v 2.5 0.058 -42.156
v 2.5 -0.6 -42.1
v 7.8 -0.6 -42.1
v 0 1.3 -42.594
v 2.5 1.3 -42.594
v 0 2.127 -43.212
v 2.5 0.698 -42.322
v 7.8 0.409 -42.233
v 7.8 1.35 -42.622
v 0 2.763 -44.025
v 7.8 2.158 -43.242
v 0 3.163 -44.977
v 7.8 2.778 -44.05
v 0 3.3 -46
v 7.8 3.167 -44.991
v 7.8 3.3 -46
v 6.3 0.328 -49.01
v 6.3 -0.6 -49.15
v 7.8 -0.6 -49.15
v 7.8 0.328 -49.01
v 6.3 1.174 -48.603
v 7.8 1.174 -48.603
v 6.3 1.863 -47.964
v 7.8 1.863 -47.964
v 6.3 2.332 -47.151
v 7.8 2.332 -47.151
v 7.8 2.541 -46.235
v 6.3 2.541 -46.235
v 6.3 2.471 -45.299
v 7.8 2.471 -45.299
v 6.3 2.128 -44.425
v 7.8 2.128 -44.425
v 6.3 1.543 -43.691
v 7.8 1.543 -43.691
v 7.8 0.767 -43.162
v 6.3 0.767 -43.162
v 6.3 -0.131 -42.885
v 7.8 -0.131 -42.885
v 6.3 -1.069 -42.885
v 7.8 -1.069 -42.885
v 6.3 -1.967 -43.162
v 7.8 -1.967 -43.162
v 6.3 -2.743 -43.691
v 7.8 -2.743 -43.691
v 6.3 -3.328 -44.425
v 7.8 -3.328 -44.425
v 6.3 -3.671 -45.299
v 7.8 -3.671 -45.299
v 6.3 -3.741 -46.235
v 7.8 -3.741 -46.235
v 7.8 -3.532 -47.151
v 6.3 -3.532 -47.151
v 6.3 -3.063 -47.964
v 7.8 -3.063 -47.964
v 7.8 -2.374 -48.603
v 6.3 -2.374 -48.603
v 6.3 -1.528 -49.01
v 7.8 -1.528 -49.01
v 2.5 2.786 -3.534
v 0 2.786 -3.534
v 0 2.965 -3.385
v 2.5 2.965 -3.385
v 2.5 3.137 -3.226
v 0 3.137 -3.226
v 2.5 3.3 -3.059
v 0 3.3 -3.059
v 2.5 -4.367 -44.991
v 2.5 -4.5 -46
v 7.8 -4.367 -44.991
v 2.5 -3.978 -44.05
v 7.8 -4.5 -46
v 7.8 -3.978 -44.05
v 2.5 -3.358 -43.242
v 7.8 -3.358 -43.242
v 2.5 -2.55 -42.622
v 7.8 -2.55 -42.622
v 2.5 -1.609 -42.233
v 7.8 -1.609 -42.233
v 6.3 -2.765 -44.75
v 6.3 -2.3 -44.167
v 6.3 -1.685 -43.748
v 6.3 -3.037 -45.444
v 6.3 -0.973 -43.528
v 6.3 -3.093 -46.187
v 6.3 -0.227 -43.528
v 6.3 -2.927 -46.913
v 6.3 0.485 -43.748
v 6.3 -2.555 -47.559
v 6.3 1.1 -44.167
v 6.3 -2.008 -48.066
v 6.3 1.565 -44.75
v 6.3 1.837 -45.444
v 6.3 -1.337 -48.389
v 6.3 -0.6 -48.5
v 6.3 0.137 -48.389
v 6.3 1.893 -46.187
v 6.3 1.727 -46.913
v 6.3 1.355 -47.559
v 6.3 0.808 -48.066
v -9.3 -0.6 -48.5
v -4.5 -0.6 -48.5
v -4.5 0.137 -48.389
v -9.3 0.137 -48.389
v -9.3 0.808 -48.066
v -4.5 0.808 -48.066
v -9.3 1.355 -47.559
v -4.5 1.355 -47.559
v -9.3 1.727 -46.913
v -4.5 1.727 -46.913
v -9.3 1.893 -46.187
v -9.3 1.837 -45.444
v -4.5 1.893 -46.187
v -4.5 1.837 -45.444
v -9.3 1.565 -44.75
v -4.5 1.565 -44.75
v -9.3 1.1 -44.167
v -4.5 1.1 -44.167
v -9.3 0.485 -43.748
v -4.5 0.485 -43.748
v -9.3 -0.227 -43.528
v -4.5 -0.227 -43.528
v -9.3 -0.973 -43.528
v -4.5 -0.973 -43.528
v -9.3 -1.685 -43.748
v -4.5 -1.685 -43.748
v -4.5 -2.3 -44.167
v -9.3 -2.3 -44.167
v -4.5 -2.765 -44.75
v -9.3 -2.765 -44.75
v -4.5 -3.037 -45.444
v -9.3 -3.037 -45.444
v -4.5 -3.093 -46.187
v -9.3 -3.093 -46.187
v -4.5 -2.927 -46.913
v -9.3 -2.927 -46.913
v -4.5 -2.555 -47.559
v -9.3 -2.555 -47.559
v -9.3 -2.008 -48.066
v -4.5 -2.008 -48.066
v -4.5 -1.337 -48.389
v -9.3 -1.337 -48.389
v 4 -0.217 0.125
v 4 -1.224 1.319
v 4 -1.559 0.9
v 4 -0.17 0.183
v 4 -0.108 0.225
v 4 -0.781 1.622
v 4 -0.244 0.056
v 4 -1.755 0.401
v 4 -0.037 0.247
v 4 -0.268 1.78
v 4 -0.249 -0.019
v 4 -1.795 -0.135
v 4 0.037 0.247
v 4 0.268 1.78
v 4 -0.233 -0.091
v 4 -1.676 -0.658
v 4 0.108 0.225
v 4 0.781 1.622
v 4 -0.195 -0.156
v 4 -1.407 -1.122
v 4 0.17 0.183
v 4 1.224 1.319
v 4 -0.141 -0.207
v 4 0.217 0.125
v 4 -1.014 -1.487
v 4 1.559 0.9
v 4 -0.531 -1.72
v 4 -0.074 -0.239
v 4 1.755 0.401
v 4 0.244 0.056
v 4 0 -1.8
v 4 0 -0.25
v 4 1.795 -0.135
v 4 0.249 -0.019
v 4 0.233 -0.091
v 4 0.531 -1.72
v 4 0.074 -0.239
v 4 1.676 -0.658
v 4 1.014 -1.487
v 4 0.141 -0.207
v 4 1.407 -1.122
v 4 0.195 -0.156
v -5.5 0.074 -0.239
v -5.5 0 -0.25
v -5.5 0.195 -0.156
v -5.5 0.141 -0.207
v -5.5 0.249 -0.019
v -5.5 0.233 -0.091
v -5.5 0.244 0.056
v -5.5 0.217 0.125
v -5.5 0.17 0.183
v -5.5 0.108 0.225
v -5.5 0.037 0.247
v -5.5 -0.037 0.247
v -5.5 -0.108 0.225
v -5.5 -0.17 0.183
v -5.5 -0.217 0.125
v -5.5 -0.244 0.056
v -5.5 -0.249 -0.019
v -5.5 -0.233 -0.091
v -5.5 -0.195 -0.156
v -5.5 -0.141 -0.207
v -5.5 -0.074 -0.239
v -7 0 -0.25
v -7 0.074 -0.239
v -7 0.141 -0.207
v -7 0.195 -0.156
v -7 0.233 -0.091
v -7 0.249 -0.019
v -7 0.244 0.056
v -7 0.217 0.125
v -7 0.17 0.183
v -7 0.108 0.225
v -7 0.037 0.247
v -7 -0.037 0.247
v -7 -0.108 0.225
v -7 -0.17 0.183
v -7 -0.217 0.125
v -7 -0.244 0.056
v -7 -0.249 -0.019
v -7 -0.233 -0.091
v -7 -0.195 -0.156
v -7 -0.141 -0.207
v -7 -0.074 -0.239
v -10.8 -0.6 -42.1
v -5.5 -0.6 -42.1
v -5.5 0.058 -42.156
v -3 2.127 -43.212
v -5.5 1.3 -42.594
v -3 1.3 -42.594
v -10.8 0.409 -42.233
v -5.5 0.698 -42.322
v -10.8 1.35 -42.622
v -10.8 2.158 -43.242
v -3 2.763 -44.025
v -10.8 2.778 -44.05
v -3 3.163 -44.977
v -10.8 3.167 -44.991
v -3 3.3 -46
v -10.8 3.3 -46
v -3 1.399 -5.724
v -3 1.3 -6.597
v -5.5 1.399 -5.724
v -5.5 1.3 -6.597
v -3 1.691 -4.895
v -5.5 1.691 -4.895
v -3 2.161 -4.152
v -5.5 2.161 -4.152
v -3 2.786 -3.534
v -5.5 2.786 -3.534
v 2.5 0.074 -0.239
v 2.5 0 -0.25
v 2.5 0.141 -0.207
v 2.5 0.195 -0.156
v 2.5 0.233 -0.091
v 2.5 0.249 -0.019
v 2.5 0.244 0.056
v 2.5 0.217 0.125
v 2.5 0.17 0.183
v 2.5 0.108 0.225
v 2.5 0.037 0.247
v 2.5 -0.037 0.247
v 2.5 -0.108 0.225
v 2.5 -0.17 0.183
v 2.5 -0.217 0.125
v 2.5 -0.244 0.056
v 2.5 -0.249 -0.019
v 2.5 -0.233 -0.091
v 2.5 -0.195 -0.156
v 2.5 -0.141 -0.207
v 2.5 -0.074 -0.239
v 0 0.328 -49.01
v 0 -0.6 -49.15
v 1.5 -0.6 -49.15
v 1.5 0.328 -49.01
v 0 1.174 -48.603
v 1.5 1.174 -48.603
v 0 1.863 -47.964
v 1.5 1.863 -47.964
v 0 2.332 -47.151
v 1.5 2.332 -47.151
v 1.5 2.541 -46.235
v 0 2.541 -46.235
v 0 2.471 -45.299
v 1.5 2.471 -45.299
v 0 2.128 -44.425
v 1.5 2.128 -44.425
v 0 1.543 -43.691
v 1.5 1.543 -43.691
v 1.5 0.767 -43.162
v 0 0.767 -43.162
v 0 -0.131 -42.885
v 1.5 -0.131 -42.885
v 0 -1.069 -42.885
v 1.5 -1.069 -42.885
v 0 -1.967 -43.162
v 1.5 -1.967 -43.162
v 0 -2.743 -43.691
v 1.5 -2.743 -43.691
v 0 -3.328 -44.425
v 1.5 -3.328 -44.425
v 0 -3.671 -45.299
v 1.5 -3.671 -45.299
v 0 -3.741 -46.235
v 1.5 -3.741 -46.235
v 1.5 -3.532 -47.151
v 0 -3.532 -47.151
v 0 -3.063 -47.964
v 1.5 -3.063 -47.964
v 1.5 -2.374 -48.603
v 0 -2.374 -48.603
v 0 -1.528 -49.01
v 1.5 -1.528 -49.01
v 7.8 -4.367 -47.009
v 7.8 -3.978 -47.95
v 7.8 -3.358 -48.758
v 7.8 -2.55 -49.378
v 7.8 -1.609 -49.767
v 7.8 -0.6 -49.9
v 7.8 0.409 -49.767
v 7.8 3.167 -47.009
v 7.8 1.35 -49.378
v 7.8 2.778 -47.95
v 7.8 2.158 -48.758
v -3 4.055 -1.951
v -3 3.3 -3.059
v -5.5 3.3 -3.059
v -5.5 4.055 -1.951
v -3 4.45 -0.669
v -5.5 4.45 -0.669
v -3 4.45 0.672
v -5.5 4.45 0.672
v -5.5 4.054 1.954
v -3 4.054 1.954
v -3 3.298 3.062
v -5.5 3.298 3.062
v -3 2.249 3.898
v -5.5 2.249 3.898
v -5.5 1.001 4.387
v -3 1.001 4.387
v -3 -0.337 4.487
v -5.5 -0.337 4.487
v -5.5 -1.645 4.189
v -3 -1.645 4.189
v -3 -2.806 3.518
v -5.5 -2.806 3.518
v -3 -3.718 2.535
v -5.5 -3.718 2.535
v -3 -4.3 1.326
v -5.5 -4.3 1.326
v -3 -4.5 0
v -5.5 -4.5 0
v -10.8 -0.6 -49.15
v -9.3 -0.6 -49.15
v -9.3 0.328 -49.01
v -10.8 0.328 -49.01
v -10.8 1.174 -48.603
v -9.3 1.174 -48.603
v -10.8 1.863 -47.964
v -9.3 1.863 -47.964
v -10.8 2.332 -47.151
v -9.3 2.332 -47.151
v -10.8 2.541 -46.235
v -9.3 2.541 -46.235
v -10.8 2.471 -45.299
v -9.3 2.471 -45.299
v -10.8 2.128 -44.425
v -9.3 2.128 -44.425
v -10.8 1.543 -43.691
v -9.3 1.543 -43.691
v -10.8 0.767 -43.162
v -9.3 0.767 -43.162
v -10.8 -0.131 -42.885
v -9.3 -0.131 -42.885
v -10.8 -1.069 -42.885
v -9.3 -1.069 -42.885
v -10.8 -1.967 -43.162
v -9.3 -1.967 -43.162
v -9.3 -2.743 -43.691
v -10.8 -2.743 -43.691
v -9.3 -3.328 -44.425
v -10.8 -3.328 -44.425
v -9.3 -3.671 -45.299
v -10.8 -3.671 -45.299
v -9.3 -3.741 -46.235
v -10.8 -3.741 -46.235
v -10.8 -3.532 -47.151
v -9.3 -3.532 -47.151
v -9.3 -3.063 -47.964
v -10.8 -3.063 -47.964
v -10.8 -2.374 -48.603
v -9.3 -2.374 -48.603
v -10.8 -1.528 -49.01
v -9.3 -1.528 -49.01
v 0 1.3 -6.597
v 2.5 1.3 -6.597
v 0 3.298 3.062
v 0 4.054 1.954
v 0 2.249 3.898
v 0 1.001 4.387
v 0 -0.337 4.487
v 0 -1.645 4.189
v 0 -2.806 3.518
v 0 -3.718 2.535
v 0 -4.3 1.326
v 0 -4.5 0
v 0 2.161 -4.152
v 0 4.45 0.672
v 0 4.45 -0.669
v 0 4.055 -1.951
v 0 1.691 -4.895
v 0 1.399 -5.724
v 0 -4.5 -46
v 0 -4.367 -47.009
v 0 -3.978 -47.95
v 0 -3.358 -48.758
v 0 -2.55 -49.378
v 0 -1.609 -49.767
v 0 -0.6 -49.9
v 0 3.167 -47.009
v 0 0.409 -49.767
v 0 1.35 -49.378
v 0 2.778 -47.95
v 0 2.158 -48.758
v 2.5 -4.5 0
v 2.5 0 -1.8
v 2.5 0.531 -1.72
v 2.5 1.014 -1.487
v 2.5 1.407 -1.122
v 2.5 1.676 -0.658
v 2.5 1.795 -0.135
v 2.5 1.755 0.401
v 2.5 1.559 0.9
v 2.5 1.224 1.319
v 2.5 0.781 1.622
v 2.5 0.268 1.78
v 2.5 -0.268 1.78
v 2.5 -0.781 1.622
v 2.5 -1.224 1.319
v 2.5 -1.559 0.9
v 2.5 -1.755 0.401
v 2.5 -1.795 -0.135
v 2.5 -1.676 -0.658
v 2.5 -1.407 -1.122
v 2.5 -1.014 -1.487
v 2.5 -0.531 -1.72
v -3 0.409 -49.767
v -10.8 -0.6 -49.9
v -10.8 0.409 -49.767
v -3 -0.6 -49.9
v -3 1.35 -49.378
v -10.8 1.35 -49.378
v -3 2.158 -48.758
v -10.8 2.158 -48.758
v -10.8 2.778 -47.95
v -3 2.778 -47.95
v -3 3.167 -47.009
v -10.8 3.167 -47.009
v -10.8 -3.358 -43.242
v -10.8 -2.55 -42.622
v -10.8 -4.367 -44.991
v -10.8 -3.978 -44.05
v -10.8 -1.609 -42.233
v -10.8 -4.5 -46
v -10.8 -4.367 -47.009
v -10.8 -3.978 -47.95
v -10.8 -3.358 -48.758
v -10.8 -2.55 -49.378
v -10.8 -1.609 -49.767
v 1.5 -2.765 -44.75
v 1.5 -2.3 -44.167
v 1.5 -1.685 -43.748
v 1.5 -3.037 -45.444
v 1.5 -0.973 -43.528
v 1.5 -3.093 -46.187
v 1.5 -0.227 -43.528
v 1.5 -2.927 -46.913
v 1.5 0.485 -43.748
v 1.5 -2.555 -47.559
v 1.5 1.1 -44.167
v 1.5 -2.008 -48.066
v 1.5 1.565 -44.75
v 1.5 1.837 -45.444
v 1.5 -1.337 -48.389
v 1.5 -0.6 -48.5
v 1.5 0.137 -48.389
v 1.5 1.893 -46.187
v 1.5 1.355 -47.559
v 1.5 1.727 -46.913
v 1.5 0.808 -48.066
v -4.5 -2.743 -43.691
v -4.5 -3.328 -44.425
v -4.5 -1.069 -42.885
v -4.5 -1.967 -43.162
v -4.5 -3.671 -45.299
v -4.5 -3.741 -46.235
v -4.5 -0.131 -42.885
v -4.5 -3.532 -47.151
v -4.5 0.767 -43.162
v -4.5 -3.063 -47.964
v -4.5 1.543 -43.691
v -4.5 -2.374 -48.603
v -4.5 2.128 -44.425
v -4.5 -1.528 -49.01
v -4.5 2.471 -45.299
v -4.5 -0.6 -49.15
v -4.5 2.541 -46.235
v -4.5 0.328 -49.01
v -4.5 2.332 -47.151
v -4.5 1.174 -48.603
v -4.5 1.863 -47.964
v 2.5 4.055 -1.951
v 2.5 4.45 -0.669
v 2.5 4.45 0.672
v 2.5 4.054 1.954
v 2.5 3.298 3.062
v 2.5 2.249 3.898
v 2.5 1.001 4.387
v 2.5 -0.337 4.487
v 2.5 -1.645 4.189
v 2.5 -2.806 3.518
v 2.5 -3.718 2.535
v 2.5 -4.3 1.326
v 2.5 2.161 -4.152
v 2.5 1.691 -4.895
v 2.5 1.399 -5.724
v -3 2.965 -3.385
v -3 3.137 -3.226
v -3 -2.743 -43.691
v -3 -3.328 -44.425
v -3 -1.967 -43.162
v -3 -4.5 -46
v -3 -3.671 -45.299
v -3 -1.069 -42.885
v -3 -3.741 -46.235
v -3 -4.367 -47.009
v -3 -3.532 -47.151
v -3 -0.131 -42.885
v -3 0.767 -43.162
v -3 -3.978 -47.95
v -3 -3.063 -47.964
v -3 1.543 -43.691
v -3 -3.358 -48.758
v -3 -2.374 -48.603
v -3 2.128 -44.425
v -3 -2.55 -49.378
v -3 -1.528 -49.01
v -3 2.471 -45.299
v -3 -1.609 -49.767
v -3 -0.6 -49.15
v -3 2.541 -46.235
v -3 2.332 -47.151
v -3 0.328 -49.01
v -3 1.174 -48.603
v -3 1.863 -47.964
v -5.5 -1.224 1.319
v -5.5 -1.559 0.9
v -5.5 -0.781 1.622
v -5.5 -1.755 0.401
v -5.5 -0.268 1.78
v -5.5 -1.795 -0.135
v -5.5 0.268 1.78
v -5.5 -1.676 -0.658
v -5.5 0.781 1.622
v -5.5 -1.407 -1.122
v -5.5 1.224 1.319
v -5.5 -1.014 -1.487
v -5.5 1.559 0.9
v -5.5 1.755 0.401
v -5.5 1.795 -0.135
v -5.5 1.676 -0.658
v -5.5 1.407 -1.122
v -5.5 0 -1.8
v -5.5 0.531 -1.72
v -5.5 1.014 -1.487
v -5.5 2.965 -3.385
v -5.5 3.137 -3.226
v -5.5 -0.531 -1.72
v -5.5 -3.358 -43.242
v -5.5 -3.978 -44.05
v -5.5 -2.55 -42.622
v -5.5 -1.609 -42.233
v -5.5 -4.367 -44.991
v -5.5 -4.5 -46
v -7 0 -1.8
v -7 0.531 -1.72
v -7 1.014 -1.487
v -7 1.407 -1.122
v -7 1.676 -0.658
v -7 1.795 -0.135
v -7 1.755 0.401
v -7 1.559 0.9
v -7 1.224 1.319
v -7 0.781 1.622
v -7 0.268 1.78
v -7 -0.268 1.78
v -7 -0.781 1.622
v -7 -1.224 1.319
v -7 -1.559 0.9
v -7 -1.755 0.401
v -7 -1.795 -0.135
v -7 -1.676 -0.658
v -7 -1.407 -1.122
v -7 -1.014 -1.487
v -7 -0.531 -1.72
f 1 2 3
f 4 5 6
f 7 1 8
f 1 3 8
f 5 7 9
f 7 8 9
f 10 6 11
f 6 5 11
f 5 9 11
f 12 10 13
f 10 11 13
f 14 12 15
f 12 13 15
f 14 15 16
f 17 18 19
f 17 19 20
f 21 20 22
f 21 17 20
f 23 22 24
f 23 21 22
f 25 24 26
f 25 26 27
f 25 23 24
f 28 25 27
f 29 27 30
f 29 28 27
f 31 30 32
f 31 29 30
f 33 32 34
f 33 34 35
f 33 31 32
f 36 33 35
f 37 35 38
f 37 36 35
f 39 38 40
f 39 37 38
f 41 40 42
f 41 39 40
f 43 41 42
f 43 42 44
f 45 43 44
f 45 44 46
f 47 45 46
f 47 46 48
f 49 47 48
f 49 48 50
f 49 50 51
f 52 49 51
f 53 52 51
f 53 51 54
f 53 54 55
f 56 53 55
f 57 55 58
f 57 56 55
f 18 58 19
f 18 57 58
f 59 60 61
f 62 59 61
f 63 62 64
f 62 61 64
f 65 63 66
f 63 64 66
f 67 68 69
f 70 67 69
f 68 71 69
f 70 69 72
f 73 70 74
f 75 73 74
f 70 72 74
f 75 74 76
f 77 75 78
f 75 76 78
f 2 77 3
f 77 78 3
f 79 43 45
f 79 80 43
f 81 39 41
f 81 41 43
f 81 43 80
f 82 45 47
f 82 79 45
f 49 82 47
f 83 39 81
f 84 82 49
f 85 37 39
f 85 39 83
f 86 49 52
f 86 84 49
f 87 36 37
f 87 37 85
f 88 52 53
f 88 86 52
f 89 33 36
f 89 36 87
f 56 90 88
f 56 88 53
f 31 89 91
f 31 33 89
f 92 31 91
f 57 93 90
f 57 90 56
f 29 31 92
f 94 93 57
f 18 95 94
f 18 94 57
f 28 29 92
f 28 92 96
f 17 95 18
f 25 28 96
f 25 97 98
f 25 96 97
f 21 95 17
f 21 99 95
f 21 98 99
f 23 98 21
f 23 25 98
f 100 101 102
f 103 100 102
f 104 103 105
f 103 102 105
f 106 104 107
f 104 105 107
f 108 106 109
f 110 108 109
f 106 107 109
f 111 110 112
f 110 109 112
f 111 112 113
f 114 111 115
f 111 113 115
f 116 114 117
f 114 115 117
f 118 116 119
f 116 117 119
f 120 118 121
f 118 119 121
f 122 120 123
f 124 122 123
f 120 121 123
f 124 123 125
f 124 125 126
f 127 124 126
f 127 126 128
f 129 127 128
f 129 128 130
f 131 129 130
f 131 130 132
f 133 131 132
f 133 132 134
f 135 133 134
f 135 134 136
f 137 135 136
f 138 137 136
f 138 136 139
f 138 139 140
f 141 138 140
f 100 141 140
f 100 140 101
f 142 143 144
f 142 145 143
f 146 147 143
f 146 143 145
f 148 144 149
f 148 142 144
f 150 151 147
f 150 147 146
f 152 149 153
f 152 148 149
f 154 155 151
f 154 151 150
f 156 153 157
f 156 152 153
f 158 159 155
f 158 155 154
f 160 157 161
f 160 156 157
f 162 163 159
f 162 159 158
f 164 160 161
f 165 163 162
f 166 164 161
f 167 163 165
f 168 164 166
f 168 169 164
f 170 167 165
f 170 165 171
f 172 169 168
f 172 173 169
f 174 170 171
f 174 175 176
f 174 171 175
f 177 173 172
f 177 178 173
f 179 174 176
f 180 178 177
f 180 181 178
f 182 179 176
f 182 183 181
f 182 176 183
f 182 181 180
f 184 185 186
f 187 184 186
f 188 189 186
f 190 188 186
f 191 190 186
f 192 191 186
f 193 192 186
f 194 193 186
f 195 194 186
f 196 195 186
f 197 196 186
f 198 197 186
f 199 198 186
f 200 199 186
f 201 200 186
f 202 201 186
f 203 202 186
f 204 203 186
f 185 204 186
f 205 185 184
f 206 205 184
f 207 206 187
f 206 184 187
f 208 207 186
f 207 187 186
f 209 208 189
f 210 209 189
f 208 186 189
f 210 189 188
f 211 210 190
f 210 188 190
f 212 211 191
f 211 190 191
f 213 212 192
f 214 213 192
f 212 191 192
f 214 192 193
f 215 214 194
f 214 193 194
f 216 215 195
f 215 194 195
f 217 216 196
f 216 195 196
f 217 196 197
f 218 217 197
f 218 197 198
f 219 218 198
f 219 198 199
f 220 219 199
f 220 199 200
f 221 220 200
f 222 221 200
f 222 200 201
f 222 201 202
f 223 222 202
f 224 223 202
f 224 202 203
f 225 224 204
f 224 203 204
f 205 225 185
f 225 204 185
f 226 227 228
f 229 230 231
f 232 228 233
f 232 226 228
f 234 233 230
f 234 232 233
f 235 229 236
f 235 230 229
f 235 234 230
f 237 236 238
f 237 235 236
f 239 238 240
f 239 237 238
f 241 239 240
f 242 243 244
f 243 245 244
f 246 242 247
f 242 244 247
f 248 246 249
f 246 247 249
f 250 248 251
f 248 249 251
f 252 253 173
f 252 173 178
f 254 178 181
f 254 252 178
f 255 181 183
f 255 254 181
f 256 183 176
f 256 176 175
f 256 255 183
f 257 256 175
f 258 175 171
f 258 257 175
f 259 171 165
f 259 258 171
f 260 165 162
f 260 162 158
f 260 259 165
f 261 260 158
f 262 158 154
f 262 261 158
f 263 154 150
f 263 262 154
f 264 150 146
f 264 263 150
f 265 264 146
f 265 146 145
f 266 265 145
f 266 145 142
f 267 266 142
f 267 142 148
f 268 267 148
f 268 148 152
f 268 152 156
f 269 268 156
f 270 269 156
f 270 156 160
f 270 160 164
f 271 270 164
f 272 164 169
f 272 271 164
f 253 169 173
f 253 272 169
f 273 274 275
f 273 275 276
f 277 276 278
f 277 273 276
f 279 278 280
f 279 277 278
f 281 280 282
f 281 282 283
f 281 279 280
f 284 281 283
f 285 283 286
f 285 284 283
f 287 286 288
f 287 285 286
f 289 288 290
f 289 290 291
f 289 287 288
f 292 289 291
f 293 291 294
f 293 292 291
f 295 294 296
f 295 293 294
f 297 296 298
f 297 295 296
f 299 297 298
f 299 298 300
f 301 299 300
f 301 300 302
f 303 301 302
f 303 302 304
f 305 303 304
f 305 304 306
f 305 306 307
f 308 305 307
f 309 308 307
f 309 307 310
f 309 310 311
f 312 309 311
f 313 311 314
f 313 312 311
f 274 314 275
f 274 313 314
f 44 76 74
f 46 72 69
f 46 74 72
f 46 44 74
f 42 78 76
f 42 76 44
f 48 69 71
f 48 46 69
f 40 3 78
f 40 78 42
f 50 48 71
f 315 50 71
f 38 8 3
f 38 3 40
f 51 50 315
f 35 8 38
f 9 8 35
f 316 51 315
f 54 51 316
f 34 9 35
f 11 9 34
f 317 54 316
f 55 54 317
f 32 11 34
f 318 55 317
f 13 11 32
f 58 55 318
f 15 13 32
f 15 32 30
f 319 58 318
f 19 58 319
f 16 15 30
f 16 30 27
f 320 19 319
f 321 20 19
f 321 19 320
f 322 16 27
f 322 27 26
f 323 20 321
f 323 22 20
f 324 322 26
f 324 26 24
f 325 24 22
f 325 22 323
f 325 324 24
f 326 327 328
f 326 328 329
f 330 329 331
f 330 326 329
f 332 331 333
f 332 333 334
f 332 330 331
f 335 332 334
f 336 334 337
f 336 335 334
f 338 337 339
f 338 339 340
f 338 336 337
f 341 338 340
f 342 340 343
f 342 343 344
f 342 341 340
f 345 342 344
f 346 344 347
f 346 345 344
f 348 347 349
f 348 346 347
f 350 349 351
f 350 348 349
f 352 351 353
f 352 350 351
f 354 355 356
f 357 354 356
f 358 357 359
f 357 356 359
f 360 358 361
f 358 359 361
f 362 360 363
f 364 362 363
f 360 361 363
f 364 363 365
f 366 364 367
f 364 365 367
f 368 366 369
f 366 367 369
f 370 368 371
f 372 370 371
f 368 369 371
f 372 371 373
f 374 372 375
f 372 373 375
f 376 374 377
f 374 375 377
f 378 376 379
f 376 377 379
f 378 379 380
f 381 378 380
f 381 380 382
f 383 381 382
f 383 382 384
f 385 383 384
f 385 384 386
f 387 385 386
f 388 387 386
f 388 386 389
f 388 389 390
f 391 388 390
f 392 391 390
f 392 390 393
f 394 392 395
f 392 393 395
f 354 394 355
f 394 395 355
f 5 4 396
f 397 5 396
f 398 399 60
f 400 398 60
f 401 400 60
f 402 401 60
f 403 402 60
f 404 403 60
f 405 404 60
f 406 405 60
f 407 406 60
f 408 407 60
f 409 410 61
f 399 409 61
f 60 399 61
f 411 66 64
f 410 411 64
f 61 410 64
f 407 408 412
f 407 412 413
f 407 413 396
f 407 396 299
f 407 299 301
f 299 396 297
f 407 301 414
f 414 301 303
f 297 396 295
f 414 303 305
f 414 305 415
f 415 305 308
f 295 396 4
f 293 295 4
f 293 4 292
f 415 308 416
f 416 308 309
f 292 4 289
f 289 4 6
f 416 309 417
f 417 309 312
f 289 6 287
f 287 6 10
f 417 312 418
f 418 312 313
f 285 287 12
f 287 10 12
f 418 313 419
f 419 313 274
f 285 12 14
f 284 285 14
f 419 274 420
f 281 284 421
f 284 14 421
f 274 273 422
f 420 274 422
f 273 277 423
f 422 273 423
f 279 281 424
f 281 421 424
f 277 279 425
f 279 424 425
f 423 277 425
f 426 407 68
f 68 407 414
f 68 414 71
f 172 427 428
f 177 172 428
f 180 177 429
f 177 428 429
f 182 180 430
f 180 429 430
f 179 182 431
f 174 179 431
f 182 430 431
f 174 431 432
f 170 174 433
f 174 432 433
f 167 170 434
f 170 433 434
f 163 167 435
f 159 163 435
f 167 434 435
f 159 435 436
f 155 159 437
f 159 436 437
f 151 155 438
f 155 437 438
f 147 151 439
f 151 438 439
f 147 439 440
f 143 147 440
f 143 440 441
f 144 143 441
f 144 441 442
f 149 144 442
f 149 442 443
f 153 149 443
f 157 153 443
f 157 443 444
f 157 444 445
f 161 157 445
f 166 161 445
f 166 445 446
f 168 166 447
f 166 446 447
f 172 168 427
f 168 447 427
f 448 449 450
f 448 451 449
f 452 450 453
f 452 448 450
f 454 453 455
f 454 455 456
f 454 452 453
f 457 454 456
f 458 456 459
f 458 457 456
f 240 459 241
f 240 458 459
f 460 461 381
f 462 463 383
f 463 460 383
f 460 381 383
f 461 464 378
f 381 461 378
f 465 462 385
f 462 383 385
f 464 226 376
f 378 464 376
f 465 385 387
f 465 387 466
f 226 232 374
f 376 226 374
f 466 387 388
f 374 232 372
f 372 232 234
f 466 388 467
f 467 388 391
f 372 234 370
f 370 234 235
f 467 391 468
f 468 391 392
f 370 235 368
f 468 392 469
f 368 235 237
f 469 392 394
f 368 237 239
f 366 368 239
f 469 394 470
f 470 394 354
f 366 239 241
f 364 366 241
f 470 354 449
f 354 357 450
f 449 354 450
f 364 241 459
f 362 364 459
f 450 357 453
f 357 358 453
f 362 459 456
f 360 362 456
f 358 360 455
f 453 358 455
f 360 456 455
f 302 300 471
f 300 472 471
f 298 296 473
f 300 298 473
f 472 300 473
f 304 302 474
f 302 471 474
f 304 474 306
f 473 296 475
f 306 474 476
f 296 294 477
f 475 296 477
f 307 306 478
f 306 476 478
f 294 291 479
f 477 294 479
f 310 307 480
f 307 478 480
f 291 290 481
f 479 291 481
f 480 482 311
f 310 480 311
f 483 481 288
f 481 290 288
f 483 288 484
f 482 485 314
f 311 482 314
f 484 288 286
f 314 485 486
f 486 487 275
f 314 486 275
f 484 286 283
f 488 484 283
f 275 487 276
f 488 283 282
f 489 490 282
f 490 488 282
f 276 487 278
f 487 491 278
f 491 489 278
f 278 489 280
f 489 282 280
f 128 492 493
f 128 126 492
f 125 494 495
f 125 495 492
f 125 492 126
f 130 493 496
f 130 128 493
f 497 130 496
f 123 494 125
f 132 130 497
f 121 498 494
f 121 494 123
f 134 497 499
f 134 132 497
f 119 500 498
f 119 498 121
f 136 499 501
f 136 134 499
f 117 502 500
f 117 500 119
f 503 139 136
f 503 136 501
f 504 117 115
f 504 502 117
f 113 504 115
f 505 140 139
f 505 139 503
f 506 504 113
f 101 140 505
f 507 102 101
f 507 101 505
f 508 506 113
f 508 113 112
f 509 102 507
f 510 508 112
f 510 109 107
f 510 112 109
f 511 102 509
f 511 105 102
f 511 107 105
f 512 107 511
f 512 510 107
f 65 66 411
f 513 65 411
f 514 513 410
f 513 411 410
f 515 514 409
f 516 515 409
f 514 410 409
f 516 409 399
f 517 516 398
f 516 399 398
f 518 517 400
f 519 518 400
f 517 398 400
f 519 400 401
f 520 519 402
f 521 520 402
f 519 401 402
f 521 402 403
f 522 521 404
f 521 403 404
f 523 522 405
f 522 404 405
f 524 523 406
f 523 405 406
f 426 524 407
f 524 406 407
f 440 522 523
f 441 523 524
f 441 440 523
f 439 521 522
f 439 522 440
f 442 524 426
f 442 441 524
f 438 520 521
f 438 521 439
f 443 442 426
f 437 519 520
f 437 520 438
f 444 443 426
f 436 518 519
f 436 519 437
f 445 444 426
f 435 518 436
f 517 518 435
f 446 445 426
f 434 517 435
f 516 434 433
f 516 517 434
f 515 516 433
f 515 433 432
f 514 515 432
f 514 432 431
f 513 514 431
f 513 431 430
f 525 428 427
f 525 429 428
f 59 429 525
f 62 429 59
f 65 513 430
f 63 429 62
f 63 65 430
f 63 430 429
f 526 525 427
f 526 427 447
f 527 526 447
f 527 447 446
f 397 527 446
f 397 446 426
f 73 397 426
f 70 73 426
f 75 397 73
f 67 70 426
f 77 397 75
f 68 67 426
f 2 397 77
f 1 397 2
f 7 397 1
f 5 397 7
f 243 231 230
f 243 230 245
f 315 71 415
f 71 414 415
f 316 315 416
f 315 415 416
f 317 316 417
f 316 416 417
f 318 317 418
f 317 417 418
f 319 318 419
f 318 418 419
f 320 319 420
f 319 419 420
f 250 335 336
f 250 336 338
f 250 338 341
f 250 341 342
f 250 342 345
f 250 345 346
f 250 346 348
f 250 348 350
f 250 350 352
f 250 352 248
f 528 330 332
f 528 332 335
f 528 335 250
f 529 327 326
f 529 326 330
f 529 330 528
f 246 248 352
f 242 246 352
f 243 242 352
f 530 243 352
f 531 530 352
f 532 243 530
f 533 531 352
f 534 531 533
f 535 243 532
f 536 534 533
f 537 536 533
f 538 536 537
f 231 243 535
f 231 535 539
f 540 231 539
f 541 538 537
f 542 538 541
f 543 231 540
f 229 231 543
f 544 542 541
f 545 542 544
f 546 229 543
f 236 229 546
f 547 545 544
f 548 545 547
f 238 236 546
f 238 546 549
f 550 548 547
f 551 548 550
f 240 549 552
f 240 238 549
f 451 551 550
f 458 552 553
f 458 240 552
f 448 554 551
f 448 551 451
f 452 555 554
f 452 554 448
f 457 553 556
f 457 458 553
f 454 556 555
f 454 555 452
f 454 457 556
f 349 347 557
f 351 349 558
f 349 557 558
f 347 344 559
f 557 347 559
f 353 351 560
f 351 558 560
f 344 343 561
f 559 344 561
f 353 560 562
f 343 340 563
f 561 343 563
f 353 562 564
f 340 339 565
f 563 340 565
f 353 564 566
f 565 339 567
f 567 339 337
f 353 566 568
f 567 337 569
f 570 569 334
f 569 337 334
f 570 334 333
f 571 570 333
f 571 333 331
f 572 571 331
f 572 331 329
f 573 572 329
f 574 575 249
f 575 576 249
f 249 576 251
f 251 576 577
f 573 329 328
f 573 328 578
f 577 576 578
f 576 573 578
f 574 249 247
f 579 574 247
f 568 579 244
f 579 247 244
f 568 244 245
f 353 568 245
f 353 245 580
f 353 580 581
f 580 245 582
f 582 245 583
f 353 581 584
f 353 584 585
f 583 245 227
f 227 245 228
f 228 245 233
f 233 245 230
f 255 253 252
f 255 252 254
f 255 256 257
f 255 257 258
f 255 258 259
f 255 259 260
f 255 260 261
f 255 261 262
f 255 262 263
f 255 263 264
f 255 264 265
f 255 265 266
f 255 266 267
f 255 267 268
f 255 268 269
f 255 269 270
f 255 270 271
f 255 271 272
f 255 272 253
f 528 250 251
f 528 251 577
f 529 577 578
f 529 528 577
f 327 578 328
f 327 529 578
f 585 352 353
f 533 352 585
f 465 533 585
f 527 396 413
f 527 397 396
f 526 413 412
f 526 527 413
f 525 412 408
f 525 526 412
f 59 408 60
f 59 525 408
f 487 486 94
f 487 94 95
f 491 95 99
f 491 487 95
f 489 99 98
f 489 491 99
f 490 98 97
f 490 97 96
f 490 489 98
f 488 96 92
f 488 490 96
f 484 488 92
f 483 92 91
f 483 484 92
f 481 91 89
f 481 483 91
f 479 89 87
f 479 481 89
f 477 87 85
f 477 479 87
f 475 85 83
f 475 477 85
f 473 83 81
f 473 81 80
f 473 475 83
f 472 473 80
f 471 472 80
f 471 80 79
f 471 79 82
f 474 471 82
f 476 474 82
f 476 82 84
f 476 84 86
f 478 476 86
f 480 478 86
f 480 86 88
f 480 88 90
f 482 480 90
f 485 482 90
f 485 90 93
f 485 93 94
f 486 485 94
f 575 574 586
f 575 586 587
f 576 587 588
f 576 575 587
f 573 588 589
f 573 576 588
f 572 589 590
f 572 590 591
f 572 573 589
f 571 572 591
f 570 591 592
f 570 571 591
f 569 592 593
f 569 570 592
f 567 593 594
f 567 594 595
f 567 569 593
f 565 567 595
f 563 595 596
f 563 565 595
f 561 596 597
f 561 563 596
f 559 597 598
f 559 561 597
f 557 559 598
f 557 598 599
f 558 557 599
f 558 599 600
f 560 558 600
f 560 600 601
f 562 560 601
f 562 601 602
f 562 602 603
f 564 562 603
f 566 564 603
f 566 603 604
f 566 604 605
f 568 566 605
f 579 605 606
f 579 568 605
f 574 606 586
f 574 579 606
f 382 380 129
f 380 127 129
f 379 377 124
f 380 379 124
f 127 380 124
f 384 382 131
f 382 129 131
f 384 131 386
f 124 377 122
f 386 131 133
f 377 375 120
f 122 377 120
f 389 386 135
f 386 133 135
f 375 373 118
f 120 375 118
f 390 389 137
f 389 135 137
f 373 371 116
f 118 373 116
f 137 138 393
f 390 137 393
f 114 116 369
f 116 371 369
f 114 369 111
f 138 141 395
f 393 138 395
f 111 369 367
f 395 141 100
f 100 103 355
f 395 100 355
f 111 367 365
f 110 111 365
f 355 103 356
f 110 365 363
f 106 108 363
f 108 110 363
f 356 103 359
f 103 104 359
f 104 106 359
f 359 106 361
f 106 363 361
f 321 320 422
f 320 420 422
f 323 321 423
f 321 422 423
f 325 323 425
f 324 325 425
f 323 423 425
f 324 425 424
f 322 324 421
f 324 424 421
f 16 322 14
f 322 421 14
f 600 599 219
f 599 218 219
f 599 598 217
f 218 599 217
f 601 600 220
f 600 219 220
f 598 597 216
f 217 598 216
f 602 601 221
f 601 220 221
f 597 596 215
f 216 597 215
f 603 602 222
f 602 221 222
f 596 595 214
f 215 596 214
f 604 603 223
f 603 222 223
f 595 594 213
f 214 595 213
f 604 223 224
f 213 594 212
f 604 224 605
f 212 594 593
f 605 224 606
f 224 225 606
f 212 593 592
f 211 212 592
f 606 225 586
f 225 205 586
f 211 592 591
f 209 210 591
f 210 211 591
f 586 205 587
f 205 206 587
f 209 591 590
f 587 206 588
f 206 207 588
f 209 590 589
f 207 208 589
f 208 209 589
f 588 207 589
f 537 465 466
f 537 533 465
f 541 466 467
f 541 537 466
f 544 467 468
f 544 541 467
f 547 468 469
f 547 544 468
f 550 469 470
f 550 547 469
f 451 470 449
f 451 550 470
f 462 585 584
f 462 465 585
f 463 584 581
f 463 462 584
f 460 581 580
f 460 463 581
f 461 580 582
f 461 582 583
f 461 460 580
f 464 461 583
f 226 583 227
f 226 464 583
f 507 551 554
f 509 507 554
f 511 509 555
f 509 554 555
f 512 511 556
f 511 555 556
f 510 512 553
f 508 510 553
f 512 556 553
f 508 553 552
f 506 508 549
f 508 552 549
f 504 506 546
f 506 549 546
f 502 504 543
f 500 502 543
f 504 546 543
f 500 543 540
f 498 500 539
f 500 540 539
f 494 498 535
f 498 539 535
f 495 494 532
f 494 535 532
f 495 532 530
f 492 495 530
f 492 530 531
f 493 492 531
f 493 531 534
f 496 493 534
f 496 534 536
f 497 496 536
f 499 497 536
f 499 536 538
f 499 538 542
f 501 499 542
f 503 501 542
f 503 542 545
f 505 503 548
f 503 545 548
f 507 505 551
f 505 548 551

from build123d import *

# Parameters (mm, degrees)
SKETCH_1_R          = 4.5
SKETCH_1_W          = 49.9
SKETCH_1_H          = 7.8
EXTRUDE_1_DEPTH     = 2.5
EXTRUDE_START       = 2.5
SKETCH_1_6_R        = 1.8
SKETCH_1_6_R_2      = 0.25
EXTRUDE_3_DEPTH     = 1.5
SKETCH_1_5_W        = 7.8
SKETCH_1_5_H        = 7.8
EXTRUDE_2_DEPTH     = 7.8
SKETCH_1_7_R        = 2.5
CUT_EXTRUDE_1_DEPTH = 51.706015422
SKETCH_1_8_R        = 3.15
SKETCH_1_8_R_2      = 2.5
CUT_EXTRUDE_2_DEPTH = 1.5
CUT_EXTRUDE_START   = 6.3
SKETCH_1_9_R        = 3.15
SKETCH_1_9_R_2      = 2.5
CUT_EXTRUDE_3_DEPTH = 1.5
SKETCH_2_W          = 0.191868154
SKETCH_2_H          = 2
SKETCH_2_W_2        = 37.6
CUT_EXTRUDE_4_DEPTH = 51.706015422
FILLET_1_R          = 3.9


with BuildPart() as part:
    # 草图1 → 凸台-拉伸1 (new body)
    with BuildSketch(Plane(origin=(0, 0, 0), x_dir=(0, 0, -1), z_dir=(1, 0, 0))):
        Circle(SKETCH_1_R)
        with Locations((24.95, -0.6)):
            Rectangle(SKETCH_1_W, SKETCH_1_H)
    extrude(amount=EXTRUDE_1_DEPTH)

    # 草图1<6> → 凸台-拉伸3 (add)
    with BuildSketch(Plane(origin=(0, 0, 0), x_dir=(0, 0, -1), z_dir=(1, 0, 0)).offset(EXTRUDE_START)):
        Circle(SKETCH_1_6_R)
        Circle(SKETCH_1_6_R_2, mode=Mode.SUBTRACT)
    extrude(amount=EXTRUDE_3_DEPTH)

    # 草图1<5> → 凸台-拉伸2 (add)
    with BuildSketch(Plane(origin=(0, 0, 0), x_dir=(0, 0, -1), z_dir=(1, 0, 0))):
        with Locations((46, -0.6)):
            Rectangle(SKETCH_1_5_W, SKETCH_1_5_H)
    extrude(amount=EXTRUDE_2_DEPTH)

    # 草图1<7> → 切除-拉伸1 (cut, through all)
    with BuildSketch(Plane(origin=(0, 0, 0), x_dir=(0, 0, -1), z_dir=(1, 0, 0))):
        with Locations((46, -0.6)):
            Circle(SKETCH_1_7_R)
    extrude(amount=CUT_EXTRUDE_1_DEPTH, mode=Mode.SUBTRACT)

    # 草图1<8> → 切除-拉伸2 (cut)
    with BuildSketch(Plane(origin=(0, 0, 0), x_dir=(0, 0, -1), z_dir=(1, 0, 0))):
        with Locations((46, -0.6)):
            Circle(SKETCH_1_8_R)
        with Locations((46, -0.6)):
            Circle(SKETCH_1_8_R_2, mode=Mode.SUBTRACT)
    extrude(amount=CUT_EXTRUDE_2_DEPTH, mode=Mode.SUBTRACT)

    # 草图1<9> → 切除-拉伸3 (cut)
    with BuildSketch(Plane(origin=(0, 0, 0), x_dir=(0, 0, -1), z_dir=(1, 0, 0)).offset(CUT_EXTRUDE_START)):
        with Locations((46, -0.6)):
            Circle(SKETCH_1_9_R)
        with Locations((46, -0.6)):
            Circle(SKETCH_1_9_R_2, mode=Mode.SUBTRACT)
    extrude(amount=CUT_EXTRUDE_3_DEPTH, mode=Mode.SUBTRACT)

    # 草图2 → 切除-拉伸4 (cut, through all)
    with BuildSketch(Plane.ZY):
        with BuildLine():
            Line((-3.059411708, 3.3), (-4.308131846, 3.3))
            Line((-4.308131846, 3.3), (-4.308131846, 1.3))
            ThreePointArc((-4.308131846, 1.3), (-3.817089795, 2.383238447), (-3.059411708, 3.3))
        make_face()
        with Locations((-4.404065923, 2.3)):
            Rectangle(SKETCH_2_W, SKETCH_2_H)
        with Locations((-23.3, 2.3)):
            Rectangle(SKETCH_2_W_2, SKETCH_2_H)
    extrude(amount=-CUT_EXTRUDE_4_DEPTH, mode=Mode.SUBTRACT)

    # 圆角1
    fillet_1_edges = [part.edges().sort_by_distance(p)[0] for p in [
        (1.25, 1.3, -4.308131846),
    ]]
    fillet(fillet_1_edges, radius=FILLET_1_R)
    fillet_1_2_edges = [part.edges().sort_by_distance(p)[0] for p in [
        (3.9, -4.5, -49.9),
        (3.9, 3.3, -49.9),
        (5.15, -4.5, -42.1),
        (3.9, 3.3, -42.1),
    ]]
    fillet(fillet_1_2_edges, radius=FILLET_1_R - 0.0001)  # a hair under: the kernel refuses the full size


with BuildPart() as body_2:
    # 镜向1: mirrored copy
    add(part.part.mirror(Plane(origin=(-1.5, 0, 0), x_dir=(0, 0, 1), z_dir=(1, 0, 0))))


solid = Compound([part.part, body_2.part])
